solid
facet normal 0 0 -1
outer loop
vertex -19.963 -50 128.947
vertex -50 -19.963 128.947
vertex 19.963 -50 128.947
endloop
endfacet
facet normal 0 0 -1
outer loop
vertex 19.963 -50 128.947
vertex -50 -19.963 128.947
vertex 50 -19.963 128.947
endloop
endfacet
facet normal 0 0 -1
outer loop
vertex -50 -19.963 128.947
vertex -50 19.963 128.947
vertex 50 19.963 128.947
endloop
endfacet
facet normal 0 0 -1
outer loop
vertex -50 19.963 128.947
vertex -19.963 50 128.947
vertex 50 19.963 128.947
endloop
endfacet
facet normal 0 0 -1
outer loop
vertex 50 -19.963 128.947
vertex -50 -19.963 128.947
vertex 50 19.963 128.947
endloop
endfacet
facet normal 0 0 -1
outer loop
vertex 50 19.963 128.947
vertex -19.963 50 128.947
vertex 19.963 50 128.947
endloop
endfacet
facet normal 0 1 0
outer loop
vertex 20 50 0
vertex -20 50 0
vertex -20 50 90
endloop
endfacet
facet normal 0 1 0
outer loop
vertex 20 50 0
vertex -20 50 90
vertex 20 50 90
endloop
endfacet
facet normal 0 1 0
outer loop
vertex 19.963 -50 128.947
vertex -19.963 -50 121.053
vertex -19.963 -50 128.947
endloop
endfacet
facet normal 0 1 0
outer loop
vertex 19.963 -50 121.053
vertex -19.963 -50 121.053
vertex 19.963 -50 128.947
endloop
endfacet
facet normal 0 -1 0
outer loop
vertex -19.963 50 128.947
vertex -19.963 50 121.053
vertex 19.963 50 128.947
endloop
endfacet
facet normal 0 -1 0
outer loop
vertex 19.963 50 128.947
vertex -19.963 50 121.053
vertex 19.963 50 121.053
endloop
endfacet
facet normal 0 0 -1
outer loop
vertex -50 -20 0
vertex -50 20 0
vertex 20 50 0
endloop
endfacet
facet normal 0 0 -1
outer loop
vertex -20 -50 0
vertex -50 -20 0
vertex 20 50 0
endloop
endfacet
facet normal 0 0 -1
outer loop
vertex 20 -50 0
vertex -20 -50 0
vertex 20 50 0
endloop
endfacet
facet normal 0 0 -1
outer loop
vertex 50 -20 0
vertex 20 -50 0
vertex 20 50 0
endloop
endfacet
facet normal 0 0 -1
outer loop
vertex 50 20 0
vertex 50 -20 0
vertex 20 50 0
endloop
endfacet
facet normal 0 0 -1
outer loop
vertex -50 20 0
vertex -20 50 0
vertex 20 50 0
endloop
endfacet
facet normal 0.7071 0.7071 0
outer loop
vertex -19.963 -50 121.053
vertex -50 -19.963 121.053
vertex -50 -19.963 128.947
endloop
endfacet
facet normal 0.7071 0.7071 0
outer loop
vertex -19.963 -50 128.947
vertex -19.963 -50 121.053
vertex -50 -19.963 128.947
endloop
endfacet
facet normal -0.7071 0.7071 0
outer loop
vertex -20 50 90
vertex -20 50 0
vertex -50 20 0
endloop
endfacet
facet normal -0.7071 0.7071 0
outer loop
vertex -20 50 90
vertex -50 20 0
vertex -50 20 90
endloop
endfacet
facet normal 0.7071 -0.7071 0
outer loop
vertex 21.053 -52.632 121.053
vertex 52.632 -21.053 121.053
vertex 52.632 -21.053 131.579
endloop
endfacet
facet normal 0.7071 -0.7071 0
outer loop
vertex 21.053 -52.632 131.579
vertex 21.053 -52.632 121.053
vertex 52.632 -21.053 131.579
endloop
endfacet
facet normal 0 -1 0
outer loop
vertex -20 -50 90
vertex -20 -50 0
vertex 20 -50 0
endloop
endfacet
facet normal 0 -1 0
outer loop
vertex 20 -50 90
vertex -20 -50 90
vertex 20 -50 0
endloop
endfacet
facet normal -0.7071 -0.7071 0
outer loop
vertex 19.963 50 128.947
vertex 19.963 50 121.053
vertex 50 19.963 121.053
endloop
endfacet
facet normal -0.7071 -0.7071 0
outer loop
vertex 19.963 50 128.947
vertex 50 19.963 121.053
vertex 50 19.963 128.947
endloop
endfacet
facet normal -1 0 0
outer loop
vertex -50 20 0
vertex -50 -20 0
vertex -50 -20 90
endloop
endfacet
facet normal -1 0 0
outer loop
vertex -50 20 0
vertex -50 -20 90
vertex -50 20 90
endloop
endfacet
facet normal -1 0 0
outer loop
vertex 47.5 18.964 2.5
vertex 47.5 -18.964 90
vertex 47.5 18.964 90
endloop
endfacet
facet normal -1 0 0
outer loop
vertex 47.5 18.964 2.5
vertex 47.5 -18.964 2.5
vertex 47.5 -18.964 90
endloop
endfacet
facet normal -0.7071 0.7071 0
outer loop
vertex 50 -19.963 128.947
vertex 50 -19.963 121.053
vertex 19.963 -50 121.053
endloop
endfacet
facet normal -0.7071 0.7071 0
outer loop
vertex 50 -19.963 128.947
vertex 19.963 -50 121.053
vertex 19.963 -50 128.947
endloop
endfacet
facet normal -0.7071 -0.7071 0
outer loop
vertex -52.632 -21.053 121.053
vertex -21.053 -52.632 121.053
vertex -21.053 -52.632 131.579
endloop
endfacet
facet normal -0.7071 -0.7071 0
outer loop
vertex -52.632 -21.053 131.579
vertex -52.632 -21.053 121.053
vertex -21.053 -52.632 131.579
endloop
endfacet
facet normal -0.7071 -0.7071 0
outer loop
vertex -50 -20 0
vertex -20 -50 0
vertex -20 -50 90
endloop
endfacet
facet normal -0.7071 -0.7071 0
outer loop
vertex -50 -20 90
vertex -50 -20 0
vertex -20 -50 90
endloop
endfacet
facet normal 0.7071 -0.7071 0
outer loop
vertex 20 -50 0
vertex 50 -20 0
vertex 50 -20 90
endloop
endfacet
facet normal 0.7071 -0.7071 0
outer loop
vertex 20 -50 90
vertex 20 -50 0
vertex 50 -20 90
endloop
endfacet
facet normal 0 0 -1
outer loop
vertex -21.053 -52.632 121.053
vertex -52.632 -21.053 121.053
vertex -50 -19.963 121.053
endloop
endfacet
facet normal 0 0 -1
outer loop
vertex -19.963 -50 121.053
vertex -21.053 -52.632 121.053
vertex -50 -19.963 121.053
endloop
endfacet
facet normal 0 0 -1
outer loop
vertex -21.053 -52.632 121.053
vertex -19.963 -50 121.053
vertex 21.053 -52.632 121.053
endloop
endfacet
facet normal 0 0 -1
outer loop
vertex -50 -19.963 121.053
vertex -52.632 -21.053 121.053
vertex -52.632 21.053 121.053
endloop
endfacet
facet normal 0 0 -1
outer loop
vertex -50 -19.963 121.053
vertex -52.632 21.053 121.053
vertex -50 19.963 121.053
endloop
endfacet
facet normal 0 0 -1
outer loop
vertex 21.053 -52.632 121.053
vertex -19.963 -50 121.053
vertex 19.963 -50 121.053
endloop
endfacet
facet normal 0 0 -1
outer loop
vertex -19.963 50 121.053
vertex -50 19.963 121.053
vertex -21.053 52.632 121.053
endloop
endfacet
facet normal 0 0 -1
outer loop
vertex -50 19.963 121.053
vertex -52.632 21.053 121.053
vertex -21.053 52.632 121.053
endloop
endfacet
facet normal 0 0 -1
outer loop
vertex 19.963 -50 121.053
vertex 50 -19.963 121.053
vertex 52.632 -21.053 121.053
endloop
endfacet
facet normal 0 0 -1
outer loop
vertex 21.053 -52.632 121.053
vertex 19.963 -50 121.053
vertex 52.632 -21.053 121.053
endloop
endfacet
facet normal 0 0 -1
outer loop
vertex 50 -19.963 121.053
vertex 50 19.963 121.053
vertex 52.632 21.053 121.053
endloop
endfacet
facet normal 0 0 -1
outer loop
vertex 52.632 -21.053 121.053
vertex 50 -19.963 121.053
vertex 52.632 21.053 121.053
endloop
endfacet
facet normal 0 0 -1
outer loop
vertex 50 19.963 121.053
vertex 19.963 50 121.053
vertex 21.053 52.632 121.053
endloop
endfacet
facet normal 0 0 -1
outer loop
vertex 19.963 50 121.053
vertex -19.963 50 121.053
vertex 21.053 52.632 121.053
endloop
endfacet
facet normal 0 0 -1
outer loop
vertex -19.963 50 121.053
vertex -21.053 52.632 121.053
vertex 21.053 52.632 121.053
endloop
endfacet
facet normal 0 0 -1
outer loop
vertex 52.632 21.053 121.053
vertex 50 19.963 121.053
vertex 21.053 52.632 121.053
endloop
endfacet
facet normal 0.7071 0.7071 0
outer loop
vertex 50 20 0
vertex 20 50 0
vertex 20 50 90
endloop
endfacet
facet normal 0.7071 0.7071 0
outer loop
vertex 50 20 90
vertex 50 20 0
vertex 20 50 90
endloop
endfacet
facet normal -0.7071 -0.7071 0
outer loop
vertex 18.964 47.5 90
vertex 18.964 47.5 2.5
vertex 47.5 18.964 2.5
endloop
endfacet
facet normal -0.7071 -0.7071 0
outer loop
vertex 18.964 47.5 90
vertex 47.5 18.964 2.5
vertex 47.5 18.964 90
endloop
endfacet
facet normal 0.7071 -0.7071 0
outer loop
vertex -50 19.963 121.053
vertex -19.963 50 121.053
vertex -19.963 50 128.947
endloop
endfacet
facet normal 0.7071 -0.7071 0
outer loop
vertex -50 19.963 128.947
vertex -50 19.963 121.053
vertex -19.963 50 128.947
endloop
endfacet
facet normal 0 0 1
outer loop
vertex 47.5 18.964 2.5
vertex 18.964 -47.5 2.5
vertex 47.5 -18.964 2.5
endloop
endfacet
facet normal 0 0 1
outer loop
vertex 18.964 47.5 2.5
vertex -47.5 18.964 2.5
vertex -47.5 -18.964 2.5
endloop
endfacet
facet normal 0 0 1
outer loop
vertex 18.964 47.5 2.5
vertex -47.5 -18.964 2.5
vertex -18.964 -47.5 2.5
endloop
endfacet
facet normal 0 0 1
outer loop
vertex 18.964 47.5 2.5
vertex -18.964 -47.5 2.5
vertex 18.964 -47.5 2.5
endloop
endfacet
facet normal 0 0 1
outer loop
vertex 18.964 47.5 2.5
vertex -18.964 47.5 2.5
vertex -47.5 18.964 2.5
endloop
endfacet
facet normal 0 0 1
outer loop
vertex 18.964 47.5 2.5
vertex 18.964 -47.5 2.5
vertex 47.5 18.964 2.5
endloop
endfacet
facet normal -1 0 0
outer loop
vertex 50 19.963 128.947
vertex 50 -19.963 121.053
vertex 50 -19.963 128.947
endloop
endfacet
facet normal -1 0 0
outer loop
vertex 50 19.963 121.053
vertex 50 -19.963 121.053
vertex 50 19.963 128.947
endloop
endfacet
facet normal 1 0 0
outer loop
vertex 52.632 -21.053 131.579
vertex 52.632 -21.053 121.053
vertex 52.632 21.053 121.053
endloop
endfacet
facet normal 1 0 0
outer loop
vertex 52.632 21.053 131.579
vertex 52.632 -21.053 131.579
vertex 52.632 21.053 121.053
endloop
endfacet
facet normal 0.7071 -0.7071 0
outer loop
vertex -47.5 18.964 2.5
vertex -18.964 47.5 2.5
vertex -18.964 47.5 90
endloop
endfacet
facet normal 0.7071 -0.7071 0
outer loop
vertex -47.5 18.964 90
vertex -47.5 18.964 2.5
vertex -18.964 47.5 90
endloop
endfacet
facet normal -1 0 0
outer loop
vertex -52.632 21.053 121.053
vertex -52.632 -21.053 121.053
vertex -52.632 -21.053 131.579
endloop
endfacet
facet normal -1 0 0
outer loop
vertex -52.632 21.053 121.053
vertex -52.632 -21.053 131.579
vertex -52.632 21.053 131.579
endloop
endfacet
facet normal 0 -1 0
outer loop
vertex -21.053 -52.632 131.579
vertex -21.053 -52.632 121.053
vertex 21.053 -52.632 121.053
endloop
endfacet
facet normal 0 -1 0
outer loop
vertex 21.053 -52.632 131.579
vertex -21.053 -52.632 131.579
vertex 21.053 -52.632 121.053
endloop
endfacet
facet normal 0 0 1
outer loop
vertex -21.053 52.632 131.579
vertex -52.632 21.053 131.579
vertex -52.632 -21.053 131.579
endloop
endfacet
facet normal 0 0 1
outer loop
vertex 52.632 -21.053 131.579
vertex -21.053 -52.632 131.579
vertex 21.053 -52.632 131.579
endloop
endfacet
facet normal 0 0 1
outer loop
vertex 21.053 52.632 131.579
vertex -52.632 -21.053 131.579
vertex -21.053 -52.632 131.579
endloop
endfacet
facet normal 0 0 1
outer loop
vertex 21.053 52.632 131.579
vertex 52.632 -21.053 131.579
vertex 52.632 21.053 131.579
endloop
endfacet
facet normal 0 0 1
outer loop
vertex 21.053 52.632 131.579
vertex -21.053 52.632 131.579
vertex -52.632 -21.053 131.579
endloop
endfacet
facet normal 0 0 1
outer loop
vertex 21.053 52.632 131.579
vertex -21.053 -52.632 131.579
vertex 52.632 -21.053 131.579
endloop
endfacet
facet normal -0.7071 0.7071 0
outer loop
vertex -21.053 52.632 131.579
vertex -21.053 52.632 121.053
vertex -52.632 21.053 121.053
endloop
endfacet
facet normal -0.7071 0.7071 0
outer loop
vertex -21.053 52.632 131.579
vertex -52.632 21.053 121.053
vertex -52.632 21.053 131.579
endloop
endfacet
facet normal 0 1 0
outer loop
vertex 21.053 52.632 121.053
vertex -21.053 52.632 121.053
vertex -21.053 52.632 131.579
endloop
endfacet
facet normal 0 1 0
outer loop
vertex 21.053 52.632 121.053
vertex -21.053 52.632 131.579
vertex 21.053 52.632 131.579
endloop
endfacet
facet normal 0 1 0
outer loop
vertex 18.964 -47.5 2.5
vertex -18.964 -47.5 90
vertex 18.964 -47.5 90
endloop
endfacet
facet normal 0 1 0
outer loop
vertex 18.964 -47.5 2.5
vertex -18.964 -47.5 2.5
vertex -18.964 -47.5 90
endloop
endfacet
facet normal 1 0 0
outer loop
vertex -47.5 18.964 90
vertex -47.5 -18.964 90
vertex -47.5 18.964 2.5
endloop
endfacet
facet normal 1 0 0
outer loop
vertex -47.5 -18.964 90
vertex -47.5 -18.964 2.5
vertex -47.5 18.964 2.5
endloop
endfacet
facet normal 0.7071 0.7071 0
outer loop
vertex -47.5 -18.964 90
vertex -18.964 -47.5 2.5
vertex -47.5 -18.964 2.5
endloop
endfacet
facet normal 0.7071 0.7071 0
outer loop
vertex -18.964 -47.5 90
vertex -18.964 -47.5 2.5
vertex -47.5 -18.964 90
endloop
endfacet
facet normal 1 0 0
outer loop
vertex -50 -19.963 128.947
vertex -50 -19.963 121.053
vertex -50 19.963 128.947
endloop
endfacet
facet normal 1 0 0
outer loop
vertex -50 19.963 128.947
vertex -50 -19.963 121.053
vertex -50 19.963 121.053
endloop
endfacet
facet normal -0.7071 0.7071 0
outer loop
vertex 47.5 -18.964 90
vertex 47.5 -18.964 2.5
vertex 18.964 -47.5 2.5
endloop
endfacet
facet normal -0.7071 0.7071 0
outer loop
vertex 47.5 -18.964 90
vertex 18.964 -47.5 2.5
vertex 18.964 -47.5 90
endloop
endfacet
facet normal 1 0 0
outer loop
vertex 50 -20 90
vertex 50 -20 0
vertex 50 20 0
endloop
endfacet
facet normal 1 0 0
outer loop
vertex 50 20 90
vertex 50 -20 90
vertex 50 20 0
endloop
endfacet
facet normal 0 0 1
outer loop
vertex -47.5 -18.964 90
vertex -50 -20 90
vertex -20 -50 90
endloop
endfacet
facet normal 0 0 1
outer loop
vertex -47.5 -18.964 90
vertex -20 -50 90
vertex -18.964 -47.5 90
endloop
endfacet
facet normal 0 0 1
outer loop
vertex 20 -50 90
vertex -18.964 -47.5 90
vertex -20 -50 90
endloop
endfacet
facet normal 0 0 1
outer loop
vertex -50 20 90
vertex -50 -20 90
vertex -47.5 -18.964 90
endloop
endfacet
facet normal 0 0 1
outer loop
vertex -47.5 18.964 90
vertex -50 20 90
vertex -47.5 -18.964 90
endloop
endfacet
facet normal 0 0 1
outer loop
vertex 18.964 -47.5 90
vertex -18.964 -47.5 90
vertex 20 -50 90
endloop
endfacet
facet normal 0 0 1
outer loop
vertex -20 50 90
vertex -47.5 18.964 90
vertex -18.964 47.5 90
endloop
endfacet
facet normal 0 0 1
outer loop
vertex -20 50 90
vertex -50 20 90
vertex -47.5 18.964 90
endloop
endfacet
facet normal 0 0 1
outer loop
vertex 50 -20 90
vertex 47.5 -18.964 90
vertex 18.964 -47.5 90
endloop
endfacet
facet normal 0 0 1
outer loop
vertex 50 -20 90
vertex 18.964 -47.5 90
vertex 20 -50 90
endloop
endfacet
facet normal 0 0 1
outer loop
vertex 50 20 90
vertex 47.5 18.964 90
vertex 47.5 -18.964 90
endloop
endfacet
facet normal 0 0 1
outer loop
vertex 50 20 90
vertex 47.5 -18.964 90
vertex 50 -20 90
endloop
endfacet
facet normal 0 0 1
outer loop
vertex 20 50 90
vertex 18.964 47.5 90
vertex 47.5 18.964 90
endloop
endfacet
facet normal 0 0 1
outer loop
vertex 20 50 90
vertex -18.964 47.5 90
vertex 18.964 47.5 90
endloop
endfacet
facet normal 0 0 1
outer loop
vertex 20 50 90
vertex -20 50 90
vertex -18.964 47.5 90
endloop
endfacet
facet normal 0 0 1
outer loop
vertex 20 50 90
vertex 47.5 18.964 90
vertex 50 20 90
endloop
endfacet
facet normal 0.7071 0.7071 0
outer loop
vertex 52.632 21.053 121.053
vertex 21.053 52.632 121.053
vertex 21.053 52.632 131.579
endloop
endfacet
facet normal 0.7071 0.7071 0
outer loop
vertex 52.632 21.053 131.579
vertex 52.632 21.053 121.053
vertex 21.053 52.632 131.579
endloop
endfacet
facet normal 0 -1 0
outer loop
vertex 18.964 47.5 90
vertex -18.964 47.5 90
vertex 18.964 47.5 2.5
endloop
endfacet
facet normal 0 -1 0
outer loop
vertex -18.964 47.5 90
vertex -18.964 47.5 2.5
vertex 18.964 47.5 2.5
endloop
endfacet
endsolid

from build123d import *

# Parameters (mm, degrees)
F0_W     = 100
F0_H     = 100
F1_DEPTH = 90
F2_SIZE  = 30
F3_T     = -2.5
F5_W     = 100
F5_H     = 100
F6_DEPTH = 10
F7_SIZE  = 30
F8_T     = -2.5
F9_SCALE = 1.052632


with BuildPart() as f1:
    # F0 (on Top) → F1 (new body)
    with BuildSketch(Plane.XY):
        Rectangle(F0_W, F0_H)
    extrude(amount=F1_DEPTH)

    # F2
    f2_edges = [f1.edges().sort_by_distance(p)[0] for p in [
        (-50, 50, 45),
        (50, 50, 45),
        (50, -50, 45),
        (-50, -50, 45),
    ]]
    chamfer(f2_edges, length=F2_SIZE)

    # F3
    f3_openings = [f1.faces().sort_by_distance(p)[0] for p in [
        (0, 0, 90),
    ]]
    offset(amount=F3_T, openings=f3_openings)


with BuildPart() as f6:
    # F5 (on offset) → F6 (new body)
    with BuildSketch(Plane.XY.offset(115)):
        Rectangle(F5_W, F5_H)
    extrude(amount=F6_DEPTH)

    # F7
    f7_edges = [f6.edges().sort_by_distance(p)[0] for p in [
        (-50, -50, 120),
        (-50, 50, 120),
        (50, 50, 120),
        (50, -50, 120),
    ]]
    chamfer(f7_edges, length=F7_SIZE)

    # F8
    f8_openings = [f6.faces().sort_by_distance(p)[0] for p in [
        (0, 0, 115),
    ]]
    offset(amount=F8_T, openings=f8_openings)


with BuildPart() as f6_1:
    # F9: moved
    add(f6.part.scale(F9_SCALE))


solid = Compound([f1.part, f6_1.part])
